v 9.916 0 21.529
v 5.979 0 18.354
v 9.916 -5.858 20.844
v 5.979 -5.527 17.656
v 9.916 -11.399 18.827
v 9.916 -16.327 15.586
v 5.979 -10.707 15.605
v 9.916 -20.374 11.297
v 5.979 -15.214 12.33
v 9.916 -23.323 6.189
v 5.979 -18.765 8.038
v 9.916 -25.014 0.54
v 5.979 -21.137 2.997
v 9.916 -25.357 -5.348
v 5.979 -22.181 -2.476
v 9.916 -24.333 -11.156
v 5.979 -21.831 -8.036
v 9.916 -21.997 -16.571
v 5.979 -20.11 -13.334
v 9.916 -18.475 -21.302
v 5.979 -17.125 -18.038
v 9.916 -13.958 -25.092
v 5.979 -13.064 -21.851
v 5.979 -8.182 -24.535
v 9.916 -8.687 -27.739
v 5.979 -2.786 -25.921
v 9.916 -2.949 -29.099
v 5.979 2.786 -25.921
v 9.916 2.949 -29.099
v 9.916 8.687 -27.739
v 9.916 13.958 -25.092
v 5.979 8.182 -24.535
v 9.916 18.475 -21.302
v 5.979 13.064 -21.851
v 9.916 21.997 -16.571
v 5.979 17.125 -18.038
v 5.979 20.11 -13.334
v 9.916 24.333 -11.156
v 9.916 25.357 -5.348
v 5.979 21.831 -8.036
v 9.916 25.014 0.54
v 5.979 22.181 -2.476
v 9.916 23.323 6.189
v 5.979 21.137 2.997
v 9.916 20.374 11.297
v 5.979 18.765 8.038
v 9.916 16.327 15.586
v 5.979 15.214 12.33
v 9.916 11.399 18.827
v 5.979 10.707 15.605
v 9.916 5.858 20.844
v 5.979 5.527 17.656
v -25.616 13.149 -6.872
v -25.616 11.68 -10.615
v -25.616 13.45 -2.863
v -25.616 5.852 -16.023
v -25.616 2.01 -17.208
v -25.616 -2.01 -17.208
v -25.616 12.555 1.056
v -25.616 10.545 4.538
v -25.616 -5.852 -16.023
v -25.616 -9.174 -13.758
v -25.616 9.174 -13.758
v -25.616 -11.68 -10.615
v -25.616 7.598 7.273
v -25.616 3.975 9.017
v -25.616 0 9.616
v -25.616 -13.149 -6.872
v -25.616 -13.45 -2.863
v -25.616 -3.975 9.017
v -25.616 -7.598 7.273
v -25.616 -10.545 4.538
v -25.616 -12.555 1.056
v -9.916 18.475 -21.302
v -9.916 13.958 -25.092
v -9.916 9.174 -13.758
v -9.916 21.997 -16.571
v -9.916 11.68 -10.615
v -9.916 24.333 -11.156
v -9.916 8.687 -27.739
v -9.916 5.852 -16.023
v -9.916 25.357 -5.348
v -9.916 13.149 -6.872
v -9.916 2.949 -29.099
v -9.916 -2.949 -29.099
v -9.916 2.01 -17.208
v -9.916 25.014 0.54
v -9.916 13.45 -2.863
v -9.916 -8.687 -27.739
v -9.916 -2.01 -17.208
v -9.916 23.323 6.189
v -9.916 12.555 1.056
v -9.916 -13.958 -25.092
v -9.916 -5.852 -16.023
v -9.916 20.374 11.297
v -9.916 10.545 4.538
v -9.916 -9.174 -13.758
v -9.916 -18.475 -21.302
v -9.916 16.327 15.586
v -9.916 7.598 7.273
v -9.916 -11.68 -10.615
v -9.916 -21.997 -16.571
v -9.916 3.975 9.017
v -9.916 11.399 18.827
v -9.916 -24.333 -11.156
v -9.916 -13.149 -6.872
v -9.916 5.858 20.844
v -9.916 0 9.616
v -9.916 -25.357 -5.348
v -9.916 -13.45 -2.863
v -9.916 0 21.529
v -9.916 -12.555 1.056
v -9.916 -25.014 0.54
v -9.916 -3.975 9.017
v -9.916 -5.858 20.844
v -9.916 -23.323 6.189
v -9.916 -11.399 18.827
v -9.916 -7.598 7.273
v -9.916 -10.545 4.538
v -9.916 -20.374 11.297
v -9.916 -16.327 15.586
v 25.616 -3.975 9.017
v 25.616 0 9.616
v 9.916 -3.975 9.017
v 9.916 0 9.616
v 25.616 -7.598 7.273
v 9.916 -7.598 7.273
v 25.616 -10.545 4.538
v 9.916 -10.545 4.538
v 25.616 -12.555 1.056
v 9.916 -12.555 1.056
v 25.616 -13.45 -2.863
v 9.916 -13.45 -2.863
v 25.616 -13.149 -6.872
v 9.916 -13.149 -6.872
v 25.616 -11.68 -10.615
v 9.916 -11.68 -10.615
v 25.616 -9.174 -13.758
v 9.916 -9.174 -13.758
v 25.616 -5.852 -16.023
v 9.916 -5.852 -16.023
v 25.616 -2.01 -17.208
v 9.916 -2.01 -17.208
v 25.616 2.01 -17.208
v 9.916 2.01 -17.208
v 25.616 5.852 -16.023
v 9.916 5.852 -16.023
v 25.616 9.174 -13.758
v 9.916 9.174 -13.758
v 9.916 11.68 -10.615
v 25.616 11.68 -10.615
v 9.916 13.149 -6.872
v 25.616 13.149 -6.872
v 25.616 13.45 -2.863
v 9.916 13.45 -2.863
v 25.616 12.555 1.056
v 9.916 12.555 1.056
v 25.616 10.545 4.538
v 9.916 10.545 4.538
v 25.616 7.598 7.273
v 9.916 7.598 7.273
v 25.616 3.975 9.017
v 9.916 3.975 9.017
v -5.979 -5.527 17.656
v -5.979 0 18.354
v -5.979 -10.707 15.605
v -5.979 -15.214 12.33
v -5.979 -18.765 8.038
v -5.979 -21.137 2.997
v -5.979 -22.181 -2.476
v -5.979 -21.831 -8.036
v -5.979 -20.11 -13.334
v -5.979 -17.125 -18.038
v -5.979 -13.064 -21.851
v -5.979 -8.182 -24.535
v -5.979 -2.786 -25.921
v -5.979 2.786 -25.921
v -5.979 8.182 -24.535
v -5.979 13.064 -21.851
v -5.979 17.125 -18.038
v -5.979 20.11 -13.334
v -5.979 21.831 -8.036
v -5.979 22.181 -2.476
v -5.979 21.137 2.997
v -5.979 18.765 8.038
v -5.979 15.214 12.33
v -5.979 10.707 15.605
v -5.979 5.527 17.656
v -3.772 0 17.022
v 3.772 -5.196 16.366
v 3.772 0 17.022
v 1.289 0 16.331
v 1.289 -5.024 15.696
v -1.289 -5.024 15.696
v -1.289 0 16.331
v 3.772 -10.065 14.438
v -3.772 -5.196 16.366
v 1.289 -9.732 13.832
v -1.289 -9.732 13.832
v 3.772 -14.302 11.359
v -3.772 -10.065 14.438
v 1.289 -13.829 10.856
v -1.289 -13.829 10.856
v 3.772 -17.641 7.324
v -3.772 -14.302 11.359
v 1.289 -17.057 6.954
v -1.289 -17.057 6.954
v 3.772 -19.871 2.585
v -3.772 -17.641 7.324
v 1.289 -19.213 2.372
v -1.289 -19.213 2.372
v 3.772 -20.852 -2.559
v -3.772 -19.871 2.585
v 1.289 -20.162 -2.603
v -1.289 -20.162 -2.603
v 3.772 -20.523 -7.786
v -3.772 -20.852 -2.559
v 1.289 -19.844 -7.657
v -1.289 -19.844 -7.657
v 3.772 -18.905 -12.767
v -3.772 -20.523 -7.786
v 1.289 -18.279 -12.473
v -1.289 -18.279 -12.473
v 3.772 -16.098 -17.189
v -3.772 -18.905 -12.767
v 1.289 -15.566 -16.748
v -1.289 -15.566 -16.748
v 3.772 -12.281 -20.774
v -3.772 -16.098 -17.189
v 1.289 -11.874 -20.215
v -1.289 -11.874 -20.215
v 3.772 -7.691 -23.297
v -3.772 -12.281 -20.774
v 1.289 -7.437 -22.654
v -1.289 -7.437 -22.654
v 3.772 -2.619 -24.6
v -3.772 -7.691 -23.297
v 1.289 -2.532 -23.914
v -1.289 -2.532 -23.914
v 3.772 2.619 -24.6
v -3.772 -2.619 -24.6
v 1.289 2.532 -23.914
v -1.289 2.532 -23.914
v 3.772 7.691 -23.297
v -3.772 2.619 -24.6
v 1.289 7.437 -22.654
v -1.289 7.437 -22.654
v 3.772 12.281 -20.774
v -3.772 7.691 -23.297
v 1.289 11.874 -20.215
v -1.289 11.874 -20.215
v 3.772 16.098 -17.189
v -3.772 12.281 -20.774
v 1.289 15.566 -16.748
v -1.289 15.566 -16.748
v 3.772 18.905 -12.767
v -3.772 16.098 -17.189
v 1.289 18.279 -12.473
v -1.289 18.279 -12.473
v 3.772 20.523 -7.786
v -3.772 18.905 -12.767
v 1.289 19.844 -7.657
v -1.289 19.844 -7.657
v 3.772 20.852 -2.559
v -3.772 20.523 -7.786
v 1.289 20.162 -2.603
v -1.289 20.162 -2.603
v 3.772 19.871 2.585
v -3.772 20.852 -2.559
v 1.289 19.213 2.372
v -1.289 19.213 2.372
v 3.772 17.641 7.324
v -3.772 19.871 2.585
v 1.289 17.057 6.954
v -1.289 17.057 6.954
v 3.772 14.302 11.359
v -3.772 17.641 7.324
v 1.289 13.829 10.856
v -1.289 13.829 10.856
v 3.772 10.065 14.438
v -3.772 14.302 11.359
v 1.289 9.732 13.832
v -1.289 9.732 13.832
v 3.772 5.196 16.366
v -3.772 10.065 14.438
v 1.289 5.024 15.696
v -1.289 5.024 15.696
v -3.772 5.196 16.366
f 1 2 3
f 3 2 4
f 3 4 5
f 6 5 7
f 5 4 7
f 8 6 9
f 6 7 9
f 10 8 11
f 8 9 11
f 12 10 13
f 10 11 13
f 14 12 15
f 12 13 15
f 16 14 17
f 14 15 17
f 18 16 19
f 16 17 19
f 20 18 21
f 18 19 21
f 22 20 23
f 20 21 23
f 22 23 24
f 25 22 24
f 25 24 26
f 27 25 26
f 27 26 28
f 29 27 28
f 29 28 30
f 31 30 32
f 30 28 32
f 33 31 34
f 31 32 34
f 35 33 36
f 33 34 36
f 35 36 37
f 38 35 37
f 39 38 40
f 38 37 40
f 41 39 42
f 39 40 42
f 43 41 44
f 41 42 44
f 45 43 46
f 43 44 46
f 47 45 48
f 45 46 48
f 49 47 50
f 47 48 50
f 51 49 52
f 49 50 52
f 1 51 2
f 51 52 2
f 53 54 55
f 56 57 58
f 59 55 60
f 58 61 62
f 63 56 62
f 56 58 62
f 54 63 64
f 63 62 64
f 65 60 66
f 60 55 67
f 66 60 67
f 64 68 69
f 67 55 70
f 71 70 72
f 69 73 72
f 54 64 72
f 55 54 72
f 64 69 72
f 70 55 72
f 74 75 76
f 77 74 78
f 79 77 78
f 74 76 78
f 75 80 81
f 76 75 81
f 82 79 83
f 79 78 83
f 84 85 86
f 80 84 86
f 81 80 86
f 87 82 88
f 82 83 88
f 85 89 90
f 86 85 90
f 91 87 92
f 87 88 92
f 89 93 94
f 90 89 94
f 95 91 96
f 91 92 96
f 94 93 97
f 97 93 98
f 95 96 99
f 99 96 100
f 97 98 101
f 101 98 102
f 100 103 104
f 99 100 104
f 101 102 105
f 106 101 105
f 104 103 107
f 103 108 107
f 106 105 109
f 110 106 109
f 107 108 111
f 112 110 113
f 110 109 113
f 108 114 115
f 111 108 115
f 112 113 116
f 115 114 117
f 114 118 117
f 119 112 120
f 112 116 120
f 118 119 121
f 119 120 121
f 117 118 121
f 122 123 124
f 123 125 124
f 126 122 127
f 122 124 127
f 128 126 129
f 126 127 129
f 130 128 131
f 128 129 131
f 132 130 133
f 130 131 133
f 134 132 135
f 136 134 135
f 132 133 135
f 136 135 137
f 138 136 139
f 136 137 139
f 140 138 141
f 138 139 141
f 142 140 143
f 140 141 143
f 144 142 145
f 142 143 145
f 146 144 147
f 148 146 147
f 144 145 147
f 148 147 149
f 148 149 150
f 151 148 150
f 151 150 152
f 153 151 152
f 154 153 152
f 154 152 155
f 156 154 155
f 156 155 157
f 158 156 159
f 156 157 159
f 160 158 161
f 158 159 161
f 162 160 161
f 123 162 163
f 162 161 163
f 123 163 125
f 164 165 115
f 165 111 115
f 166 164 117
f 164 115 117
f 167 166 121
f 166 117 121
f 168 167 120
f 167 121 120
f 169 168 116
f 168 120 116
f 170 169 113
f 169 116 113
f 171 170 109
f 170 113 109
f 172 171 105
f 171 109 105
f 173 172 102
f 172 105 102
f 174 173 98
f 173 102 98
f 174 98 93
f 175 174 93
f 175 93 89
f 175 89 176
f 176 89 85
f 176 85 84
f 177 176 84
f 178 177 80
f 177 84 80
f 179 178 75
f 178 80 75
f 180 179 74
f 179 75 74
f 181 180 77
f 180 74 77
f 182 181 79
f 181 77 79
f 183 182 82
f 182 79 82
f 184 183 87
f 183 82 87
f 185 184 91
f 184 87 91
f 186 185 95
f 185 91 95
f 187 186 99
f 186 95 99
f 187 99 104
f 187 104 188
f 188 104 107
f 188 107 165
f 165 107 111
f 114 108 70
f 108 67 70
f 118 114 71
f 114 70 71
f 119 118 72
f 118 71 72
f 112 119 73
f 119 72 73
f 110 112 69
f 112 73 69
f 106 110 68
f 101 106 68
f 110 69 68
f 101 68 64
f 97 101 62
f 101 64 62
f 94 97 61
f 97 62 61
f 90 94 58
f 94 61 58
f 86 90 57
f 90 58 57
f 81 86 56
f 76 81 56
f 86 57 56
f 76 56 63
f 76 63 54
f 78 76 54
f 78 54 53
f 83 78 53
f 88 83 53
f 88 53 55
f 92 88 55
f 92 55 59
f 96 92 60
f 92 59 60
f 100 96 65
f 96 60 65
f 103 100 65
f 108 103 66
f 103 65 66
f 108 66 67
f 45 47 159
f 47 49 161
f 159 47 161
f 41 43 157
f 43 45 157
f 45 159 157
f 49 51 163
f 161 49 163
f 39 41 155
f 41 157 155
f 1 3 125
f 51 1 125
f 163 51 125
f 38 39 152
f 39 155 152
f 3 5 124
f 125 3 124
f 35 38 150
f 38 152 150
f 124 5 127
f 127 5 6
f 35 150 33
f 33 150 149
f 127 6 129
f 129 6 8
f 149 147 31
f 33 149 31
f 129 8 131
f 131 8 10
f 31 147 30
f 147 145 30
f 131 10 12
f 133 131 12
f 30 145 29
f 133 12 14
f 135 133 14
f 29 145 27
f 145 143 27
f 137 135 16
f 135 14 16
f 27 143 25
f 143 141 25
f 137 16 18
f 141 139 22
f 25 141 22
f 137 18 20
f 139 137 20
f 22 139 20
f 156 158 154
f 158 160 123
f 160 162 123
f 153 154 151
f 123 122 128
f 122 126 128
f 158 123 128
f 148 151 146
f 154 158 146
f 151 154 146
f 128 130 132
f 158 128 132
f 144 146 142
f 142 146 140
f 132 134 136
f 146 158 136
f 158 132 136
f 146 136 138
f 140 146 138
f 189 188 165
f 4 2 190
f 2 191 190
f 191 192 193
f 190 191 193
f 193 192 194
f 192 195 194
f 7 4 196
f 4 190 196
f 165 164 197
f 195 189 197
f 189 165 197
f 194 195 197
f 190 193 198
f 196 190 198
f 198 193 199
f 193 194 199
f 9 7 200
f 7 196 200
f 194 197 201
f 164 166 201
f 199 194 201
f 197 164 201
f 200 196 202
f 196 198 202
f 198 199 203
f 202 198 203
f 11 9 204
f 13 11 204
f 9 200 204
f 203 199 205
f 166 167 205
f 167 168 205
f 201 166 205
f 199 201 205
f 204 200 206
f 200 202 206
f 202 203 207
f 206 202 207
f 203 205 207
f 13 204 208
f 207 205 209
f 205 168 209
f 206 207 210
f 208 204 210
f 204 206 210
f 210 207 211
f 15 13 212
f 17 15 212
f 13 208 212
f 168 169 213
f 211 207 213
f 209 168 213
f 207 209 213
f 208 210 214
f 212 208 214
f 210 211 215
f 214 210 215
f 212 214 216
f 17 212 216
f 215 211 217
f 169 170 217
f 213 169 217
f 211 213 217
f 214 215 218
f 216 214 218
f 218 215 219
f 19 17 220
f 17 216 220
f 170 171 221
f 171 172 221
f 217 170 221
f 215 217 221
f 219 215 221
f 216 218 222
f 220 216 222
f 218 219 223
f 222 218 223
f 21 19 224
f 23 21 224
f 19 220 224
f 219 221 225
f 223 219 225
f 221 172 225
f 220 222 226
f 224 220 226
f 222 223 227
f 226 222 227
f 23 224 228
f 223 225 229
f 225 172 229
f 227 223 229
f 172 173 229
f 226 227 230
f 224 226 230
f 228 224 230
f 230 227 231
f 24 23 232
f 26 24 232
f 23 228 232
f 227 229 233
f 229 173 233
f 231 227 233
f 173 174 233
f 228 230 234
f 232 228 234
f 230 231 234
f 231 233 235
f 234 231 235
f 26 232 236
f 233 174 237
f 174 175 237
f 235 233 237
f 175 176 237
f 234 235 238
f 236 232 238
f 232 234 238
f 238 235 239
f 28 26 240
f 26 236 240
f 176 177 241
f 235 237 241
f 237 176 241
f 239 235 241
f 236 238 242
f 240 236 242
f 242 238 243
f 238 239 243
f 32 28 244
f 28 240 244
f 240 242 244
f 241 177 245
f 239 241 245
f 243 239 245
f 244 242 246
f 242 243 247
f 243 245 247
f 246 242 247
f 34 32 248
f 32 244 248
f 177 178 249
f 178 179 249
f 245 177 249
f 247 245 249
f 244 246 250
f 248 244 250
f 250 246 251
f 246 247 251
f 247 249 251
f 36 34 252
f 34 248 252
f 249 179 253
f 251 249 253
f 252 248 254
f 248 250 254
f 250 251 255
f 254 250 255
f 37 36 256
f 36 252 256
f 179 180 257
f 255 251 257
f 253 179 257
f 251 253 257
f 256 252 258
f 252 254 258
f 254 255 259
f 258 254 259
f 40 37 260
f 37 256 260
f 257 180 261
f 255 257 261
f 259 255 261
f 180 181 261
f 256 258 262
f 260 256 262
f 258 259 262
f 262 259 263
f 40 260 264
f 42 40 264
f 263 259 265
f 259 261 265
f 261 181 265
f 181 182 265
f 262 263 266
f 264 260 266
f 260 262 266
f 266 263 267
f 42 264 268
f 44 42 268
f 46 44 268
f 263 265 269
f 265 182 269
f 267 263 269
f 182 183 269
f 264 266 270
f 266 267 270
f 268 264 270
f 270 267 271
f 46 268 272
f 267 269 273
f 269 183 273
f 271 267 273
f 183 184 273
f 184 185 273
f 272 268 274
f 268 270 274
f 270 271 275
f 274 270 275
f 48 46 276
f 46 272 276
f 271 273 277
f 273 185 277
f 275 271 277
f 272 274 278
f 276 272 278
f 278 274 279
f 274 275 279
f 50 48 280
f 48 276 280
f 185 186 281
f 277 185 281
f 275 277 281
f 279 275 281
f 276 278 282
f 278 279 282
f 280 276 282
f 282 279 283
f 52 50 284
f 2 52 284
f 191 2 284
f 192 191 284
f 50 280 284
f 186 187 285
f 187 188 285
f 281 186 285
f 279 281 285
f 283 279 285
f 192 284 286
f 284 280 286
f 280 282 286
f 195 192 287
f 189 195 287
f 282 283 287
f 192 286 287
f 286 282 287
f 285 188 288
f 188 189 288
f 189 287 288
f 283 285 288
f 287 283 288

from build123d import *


with BuildPart() as f1:
    # F0 (on Front) → F1 (revolve)
    with BuildSketch(Plane.XZ):
        with BuildLine():
            Line((-25.6159, 9.616317), (-25.6159, -3.871083))
            Line((-25.6159, -3.871083), (25.6159, -3.871083))
            Line((25.6159, -3.871083), (25.6159, 9.616317))
            Line((25.6159, 9.616317), (9.916342, 9.616317))
            Line((9.916342, 9.616317), (9.916342, 21.528917))
            Line((9.916342, 21.528917), (5.979342, 18.353917))
            ThreePointArc((5.979342, 18.353917), (0, 16.243301), (-5.979342, 18.353917))
            Line((-5.979342, 18.353917), (-9.916342, 21.528917))
            Line((-9.916342, 21.528917), (-9.916342, 9.616317))
            Line((-9.916342, 9.616317), (-25.6159, 9.616317))
        make_face()
    revolve(axis=Axis((0, 0, -3.871083), (1, 0, 0)))


solid = f1.part
